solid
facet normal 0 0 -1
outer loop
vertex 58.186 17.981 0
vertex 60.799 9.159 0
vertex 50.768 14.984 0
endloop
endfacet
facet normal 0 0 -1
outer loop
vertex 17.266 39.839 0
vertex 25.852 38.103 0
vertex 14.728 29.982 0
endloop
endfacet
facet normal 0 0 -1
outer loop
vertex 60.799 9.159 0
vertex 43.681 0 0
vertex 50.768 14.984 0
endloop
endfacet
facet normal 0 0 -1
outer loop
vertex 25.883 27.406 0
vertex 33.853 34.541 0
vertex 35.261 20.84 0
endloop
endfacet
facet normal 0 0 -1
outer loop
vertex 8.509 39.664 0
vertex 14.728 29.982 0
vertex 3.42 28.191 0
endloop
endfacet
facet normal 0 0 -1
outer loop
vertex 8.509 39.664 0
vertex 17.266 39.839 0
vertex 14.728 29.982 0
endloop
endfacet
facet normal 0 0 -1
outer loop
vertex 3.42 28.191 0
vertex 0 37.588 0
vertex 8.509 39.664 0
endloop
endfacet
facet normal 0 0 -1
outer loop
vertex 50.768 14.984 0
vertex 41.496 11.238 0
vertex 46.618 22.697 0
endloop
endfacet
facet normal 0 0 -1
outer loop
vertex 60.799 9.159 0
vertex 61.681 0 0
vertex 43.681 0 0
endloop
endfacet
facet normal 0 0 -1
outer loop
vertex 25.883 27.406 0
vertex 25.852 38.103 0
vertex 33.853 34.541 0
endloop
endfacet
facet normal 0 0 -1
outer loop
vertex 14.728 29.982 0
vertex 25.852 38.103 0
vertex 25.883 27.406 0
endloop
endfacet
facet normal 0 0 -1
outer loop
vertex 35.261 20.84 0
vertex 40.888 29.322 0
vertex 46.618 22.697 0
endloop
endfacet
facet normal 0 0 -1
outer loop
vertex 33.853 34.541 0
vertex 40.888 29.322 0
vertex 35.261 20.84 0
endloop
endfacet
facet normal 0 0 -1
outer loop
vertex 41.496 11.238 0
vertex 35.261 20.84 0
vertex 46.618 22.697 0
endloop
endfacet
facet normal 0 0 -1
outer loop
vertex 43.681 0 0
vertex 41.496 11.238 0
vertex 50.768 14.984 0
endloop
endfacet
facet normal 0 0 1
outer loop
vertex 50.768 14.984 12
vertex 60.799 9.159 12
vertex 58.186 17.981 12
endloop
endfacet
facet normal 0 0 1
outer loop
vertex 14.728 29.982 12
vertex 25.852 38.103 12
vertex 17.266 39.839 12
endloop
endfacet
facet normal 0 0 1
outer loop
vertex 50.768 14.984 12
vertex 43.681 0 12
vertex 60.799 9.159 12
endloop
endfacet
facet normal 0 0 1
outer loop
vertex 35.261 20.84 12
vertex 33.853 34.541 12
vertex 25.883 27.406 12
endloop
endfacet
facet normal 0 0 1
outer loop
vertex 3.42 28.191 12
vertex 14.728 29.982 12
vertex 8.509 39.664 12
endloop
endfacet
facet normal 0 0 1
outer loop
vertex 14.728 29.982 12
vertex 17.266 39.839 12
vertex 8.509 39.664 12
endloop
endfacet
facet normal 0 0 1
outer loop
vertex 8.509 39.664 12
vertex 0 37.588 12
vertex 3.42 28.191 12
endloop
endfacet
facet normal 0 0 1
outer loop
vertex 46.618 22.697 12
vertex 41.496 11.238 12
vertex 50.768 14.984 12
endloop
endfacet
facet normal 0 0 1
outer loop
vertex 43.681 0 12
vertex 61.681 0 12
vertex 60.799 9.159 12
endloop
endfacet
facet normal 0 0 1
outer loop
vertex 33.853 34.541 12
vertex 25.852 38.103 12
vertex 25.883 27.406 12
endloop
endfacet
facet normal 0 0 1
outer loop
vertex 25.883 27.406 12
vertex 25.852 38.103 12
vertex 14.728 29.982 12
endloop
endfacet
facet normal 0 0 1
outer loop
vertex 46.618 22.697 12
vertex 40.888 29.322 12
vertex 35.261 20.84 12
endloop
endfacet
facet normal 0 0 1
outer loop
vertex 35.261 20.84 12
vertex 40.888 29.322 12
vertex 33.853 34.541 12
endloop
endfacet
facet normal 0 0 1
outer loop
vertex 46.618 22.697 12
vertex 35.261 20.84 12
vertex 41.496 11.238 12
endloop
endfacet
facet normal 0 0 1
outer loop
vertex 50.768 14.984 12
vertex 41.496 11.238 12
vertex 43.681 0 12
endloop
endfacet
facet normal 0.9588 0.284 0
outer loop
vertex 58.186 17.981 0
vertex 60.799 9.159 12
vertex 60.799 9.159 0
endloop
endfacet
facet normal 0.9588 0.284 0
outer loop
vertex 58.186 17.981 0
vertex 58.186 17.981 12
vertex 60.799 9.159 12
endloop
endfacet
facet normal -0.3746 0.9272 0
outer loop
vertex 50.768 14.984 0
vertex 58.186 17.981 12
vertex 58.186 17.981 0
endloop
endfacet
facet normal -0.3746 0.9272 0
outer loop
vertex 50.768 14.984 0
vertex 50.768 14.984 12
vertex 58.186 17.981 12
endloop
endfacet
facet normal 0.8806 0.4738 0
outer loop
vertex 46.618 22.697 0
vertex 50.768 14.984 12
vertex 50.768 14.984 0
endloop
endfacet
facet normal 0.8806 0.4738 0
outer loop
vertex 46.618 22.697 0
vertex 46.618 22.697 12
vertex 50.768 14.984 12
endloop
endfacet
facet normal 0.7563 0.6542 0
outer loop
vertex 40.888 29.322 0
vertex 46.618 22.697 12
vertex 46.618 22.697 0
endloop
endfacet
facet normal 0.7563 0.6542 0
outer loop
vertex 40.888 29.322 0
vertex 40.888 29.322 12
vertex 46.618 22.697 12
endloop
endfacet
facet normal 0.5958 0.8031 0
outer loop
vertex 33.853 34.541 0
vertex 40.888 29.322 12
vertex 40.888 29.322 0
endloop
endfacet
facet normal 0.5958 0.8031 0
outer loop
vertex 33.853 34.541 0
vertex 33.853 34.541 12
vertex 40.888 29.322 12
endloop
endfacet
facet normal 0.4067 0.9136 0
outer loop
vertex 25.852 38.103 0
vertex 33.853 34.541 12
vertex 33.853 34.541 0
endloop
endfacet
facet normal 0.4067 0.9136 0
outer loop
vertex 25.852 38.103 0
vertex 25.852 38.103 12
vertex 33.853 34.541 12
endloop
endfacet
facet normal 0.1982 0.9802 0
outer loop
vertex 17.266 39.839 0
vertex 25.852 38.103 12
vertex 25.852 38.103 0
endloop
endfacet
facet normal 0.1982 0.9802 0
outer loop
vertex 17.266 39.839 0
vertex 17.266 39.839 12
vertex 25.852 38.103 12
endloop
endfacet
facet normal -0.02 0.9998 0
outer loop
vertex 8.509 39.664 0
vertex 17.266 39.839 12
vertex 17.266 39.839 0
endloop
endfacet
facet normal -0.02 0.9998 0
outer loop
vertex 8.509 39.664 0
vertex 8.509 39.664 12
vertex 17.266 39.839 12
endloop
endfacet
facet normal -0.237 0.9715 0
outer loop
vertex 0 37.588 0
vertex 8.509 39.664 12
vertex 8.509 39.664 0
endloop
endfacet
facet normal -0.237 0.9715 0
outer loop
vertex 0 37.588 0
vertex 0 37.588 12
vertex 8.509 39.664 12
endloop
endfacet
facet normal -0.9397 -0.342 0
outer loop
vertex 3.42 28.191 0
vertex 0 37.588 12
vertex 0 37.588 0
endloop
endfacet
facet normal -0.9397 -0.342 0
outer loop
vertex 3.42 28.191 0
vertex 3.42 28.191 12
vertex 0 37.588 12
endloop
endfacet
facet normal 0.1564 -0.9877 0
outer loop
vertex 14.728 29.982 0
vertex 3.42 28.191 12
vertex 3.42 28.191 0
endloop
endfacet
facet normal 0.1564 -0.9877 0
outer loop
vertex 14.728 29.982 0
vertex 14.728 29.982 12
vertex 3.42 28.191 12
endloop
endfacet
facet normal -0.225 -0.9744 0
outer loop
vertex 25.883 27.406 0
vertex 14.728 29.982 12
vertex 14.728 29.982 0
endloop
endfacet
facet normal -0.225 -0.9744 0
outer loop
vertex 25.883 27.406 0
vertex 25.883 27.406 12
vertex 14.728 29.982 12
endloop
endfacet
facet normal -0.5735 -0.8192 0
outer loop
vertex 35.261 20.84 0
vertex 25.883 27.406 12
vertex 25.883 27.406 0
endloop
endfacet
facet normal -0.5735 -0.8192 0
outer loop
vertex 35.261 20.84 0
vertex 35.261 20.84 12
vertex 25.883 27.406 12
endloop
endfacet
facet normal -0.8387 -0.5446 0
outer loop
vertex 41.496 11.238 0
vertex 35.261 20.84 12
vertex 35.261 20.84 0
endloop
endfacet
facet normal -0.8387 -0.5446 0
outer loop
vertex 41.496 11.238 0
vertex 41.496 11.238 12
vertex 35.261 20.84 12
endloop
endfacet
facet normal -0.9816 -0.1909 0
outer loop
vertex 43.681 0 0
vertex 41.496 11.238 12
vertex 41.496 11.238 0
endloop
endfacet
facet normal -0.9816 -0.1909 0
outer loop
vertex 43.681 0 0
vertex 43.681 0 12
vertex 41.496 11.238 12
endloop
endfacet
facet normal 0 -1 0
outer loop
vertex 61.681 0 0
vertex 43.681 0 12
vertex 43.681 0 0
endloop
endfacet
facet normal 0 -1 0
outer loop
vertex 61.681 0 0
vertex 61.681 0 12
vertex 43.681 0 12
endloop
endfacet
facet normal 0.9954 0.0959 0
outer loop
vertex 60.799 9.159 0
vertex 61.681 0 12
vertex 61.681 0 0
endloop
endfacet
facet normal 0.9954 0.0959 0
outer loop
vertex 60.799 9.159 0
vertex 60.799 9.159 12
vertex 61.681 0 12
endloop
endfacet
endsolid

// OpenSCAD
$fn = 32;

// ----------------------------------------------------------------------
// Arc stop: segment, 12 mm thick
// ----------------------------------------------------------------------

// --- parameters (mm) ---
profile_height = 12;      // extrusion height
profile_points = 17;      // points of the closed outline

profile = [[61.681, 0], [60.799, 9.159], [58.186, 17.981], [50.768, 14.984], [46.618, 22.697], [40.888, 29.322], [33.853, 34.541], [25.852, 38.103], [17.266, 39.839], [8.509, 39.664], [0, 37.588], [3.42, 28.191], [14.728, 29.982], [25.883, 27.406], [35.261, 20.84], [41.496, 11.238], [43.681, 0]];  // single closed polygon, 17 points, counter clockwise

// --- the one profile operation ---
linear_extrude(height = profile_height) polygon(points = profile);
